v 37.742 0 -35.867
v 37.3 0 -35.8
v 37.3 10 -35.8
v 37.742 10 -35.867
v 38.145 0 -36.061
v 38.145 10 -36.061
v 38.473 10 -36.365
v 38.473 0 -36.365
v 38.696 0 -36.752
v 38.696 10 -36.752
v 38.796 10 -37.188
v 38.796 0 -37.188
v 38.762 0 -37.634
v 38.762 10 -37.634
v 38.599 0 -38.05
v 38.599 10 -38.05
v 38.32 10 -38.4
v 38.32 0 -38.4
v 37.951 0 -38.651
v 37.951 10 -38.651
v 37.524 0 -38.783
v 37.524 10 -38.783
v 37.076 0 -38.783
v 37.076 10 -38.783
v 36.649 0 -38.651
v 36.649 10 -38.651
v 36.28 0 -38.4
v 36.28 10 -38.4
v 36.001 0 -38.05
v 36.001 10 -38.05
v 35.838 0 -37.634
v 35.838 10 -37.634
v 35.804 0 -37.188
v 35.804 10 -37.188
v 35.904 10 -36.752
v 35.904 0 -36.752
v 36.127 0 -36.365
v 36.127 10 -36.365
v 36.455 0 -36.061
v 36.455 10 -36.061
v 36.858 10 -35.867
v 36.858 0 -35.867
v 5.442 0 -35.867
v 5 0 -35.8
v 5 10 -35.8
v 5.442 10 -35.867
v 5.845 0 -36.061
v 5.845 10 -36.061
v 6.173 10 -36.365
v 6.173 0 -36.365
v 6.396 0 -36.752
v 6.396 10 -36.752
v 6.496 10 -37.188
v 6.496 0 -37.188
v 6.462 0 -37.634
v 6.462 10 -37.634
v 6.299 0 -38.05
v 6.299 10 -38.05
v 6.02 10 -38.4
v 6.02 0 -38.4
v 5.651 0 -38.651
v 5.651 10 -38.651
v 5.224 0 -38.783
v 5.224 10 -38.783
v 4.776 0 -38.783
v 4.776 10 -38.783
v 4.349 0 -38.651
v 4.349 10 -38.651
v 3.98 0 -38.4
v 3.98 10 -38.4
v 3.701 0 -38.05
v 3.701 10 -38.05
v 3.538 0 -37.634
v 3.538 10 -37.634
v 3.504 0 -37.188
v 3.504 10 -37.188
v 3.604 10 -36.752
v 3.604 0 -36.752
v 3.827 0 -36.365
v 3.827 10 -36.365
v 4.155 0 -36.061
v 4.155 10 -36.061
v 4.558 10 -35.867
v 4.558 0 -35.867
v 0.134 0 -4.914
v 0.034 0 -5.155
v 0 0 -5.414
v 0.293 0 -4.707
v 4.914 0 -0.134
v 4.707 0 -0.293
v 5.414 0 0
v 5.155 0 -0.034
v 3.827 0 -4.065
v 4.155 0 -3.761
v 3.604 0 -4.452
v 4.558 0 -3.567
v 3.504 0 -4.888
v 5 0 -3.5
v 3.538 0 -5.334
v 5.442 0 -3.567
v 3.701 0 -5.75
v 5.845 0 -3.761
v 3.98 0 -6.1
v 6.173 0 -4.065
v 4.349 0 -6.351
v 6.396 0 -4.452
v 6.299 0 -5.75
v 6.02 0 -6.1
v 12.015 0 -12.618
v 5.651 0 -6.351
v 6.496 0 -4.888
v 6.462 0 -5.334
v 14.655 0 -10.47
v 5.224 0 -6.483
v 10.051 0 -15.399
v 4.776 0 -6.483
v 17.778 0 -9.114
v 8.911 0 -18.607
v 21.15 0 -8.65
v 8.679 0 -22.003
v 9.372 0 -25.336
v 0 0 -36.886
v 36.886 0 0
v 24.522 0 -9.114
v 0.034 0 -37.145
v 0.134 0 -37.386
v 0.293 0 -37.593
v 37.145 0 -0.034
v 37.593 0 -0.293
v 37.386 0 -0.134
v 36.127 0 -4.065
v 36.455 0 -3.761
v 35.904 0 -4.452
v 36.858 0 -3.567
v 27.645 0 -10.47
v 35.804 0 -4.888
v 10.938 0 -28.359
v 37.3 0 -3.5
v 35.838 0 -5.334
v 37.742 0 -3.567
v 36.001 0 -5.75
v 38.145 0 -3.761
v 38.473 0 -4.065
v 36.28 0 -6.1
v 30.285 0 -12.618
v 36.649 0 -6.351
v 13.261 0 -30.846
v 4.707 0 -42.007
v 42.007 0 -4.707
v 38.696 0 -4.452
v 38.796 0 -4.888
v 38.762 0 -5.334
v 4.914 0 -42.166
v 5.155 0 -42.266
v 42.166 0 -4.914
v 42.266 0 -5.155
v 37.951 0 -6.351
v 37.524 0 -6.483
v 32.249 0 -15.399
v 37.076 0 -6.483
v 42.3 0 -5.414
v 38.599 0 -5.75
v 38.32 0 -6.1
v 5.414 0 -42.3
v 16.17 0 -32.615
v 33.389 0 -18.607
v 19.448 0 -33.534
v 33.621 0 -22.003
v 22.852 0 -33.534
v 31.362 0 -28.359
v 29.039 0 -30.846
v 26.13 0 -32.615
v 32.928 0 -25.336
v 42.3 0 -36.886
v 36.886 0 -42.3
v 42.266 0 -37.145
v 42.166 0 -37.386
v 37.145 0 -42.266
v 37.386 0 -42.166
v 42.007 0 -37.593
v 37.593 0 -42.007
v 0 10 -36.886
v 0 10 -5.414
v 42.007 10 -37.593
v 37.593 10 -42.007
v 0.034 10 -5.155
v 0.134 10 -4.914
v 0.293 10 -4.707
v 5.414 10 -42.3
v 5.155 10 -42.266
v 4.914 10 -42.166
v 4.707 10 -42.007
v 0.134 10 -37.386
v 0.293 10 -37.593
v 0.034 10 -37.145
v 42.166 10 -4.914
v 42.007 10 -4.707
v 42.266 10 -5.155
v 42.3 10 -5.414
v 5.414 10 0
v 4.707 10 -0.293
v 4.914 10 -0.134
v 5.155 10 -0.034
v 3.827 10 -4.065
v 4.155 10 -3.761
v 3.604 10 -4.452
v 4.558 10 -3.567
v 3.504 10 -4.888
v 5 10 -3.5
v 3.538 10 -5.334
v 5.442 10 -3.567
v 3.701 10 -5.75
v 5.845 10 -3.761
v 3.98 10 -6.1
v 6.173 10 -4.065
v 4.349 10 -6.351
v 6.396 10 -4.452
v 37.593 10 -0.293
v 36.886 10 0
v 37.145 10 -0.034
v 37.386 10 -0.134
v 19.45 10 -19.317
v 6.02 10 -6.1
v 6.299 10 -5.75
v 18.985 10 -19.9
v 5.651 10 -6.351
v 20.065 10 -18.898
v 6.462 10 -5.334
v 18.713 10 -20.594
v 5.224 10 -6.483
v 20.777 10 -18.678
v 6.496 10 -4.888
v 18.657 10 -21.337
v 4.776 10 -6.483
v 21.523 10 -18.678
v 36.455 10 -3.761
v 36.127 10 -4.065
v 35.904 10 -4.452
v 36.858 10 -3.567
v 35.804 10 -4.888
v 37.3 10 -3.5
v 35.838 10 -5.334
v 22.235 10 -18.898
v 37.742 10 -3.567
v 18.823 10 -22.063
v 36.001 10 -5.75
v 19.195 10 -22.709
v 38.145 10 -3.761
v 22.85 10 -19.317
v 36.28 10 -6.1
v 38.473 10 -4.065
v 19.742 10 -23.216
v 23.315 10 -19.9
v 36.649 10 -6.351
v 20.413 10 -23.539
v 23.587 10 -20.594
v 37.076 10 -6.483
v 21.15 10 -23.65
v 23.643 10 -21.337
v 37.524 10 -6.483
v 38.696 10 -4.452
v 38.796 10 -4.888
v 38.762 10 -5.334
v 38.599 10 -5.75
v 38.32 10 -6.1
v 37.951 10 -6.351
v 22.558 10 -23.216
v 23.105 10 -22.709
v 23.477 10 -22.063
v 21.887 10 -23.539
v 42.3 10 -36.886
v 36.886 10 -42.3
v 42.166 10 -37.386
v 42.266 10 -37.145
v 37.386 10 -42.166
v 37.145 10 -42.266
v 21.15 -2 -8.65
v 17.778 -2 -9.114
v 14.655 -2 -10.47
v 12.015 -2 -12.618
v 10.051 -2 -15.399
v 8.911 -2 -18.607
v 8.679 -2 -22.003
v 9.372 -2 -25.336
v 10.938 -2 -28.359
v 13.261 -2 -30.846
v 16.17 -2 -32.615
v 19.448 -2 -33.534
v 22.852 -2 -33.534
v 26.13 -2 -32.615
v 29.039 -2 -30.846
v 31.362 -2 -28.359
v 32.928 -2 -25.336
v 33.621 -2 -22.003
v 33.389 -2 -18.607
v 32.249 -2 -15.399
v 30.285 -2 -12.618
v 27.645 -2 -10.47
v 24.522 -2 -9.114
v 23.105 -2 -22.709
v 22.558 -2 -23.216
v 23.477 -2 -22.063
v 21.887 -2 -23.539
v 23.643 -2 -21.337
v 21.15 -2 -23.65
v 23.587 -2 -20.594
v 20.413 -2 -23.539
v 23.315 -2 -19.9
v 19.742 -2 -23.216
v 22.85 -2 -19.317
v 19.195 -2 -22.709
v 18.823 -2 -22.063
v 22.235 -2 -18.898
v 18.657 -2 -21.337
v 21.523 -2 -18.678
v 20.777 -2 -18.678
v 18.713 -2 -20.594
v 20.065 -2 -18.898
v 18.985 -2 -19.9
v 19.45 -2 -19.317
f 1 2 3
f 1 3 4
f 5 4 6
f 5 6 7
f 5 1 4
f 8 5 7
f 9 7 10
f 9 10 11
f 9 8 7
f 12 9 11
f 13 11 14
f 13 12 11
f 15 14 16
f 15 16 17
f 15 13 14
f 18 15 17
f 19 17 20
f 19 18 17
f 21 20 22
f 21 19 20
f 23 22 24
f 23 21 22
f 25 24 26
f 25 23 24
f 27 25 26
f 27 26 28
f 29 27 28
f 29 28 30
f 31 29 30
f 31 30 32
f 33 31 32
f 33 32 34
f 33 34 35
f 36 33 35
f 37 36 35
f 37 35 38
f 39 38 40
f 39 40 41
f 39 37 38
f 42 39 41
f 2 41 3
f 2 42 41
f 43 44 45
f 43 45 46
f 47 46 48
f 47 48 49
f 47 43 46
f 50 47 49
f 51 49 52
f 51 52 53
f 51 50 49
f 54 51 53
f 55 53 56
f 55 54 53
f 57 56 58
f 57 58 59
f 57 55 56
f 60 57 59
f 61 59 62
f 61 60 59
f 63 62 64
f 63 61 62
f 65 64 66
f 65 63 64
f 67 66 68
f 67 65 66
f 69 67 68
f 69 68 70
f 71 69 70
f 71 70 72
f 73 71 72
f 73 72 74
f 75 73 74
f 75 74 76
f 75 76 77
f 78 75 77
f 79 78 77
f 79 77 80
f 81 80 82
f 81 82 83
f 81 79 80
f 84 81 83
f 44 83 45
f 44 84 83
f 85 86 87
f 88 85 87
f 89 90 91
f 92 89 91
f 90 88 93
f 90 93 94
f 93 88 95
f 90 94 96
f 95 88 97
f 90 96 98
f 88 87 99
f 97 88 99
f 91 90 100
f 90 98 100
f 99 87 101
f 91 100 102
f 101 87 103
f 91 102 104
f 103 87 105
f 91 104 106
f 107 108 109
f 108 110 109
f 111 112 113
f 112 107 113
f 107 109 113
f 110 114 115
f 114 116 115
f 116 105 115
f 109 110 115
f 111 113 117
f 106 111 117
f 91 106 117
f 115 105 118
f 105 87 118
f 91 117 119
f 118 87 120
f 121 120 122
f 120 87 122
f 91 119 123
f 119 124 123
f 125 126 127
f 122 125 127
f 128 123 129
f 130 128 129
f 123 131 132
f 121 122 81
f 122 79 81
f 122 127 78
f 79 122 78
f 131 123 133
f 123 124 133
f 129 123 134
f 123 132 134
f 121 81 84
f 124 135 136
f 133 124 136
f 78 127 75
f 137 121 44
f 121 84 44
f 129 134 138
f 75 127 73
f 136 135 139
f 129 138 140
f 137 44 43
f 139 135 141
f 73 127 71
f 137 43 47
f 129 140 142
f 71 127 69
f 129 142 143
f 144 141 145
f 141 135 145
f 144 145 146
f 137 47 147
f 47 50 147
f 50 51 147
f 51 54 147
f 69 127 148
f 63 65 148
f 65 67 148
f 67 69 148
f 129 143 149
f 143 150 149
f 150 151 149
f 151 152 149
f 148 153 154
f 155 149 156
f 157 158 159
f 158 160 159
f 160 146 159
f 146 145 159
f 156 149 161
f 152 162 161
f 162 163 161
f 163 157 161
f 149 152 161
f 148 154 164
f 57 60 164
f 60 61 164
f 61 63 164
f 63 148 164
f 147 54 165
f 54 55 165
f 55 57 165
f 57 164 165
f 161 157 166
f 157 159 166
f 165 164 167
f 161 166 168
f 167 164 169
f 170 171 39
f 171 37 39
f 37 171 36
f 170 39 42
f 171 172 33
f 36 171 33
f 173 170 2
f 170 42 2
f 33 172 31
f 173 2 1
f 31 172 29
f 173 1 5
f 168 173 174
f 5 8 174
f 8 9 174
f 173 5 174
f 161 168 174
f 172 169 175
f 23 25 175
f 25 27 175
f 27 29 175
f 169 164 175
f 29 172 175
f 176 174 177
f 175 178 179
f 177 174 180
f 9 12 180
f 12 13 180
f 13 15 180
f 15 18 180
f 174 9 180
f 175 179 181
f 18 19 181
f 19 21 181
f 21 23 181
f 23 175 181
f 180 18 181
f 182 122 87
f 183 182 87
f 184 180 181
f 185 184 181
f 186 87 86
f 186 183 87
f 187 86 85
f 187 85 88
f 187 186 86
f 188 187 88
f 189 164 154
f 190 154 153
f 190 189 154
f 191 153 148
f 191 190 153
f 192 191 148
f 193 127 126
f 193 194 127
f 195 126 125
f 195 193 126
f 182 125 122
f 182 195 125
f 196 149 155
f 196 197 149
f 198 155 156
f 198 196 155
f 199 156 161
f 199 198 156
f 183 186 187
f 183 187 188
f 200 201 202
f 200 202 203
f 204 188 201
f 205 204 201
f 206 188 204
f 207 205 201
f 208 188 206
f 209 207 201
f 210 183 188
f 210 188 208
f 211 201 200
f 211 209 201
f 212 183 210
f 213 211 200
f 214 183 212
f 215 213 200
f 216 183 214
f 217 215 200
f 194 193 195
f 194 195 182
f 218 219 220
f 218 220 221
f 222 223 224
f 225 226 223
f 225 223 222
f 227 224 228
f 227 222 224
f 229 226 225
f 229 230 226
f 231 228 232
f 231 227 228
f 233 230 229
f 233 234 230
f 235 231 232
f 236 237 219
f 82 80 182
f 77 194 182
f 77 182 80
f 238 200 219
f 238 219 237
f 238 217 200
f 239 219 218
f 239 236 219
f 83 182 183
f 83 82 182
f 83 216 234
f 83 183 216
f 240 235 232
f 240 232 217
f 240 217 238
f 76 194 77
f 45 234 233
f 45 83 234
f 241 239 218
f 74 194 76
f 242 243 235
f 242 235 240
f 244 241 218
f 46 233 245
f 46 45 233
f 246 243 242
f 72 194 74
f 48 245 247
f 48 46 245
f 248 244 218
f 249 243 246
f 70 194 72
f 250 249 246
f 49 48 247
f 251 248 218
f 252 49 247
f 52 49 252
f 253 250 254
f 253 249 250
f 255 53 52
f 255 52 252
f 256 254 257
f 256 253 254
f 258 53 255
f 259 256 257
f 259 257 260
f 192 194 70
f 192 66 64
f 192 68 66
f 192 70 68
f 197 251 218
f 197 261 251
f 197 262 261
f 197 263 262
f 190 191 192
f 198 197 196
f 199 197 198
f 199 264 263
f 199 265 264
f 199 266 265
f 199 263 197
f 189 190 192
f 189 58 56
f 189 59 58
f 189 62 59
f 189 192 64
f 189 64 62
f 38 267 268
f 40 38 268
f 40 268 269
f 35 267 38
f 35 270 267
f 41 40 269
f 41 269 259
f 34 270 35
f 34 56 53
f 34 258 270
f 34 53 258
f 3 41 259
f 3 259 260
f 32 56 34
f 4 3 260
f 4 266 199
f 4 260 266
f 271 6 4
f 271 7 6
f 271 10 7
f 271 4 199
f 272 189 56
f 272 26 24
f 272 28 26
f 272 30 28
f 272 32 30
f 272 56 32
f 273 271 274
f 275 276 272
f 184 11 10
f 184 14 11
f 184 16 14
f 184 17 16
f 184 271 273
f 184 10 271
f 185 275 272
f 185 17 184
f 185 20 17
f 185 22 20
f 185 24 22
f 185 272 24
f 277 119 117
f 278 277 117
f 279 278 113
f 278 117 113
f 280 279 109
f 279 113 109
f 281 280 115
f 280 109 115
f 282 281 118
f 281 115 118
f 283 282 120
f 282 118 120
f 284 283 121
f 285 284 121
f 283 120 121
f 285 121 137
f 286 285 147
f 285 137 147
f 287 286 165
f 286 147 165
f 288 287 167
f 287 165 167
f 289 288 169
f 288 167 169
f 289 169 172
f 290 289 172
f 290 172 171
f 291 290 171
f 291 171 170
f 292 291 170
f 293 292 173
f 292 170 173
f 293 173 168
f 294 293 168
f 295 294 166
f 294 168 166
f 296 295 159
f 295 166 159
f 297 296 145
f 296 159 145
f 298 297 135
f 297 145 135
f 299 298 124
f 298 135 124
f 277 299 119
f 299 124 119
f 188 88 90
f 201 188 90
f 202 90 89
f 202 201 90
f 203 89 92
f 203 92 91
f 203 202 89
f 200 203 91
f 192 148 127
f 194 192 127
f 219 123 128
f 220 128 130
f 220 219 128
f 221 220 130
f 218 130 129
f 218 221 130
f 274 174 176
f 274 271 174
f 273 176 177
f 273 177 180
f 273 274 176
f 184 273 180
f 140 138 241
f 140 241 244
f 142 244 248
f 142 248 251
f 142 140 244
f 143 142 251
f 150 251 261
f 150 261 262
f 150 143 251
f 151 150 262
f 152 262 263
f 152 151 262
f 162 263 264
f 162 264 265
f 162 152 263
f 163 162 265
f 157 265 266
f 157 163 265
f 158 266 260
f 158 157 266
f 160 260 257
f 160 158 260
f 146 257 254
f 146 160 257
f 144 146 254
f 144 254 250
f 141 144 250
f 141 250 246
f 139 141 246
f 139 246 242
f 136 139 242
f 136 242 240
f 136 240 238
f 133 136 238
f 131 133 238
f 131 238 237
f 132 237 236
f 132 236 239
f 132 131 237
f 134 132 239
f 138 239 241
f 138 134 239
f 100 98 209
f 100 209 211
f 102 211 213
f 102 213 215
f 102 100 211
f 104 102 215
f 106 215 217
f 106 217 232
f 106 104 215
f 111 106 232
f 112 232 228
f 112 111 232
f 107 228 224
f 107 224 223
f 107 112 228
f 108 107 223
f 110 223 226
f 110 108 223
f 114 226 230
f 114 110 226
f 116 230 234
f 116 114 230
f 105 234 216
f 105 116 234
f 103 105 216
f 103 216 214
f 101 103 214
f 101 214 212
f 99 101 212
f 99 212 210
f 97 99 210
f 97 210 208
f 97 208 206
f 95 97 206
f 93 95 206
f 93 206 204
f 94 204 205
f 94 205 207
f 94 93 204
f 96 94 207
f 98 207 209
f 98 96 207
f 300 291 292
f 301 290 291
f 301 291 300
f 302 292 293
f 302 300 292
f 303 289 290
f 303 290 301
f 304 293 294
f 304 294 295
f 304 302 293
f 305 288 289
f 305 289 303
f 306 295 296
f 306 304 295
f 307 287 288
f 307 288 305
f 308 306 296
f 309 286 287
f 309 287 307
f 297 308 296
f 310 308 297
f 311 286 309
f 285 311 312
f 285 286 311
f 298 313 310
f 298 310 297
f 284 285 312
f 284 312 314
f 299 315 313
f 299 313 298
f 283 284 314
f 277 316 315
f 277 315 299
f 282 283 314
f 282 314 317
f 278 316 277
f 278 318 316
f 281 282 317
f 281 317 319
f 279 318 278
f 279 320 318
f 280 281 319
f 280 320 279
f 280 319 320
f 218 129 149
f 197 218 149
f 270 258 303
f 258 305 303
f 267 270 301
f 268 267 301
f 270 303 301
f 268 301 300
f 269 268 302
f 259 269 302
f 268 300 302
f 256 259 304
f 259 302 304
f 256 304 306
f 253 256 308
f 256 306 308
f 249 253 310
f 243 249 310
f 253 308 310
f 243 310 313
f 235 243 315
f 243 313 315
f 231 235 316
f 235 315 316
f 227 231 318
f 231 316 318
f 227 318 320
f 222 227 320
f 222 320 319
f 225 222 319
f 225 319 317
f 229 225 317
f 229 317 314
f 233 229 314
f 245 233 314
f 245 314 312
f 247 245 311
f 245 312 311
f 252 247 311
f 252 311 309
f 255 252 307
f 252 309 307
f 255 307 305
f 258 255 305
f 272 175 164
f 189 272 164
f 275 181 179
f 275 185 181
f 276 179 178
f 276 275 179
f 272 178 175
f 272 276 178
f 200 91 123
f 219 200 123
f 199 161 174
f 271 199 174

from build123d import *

# Parameters (mm, degrees)
SKETCH1_R           = 1.5
BOSS_EXTRUDE1_DEPTH = 10
FILLET1_R           = 1
FILLET2_R           = 1
FILLET3_R           = 1
FILLET4_R           = 1
FILLET5_R           = 1
FILLET6_R           = 1
FILLET7_R           = 1
FILLET8_R           = 1
SKETCH2_R           = 12.5
BOSS_EXTRUDE2_DEPTH = 2
SKETCH4_R           = 2.5
CUT_EXTRUDE1_DEPTH  = 10
SKETCH5_R           = 2.5
CUT_EXTRUDE2_DEPTH  = 50


with BuildPart() as part:
    # Sketch1 → Boss-Extrude1 (new body)
    with BuildSketch(Plane(origin=(0, 0, 0), x_dir=(1, 0, 0), z_dir=(0, 1, 0))):
        Polygon((37.3, 42.3), (5, 42.3), (0, 37.3), (0, 5), (5, 0), (37.3, 0), (42.3, 5), (42.3, 37.3), align=None)
        with Locations(Location((5, 5, 0), (0, 0, 270))):
            Circle(SKETCH1_R, mode=Mode.SUBTRACT)
        with Locations(Location((37.3, 5, 0), (0, 0, 270))):
            Circle(SKETCH1_R, mode=Mode.SUBTRACT)
        with Locations(Location((5, 37.3, 0), (0, 0, 270))):
            Circle(SKETCH1_R, mode=Mode.SUBTRACT)
        with Locations(Location((37.3, 37.3, 0), (0, 0, 270))):
            Circle(SKETCH1_R, mode=Mode.SUBTRACT)
    extrude(amount=BOSS_EXTRUDE1_DEPTH)

    # Fillet1
    fillet1_edges = [part.edges().sort_by_distance(p)[0] for p in [
        (0, 5, -5),
    ]]
    fillet(fillet1_edges, radius=FILLET1_R)

    # Fillet2
    fillet2_edges = [part.edges().sort_by_distance(p)[0] for p in [
        (5, 5, 0),
    ]]
    fillet(fillet2_edges, radius=FILLET2_R)

    # Fillet3
    fillet3_edges = [part.edges().sort_by_distance(p)[0] for p in [
        (37.3, 5, 0),
    ]]
    fillet(fillet3_edges, radius=FILLET3_R)

    # Fillet4
    fillet4_edges = [part.edges().sort_by_distance(p)[0] for p in [
        (42.3, 5, -5),
    ]]
    fillet(fillet4_edges, radius=FILLET4_R)

    # Fillet5
    fillet5_edges = [part.edges().sort_by_distance(p)[0] for p in [
        (42.3, 5, -37.3),
    ]]
    fillet(fillet5_edges, radius=FILLET5_R)

    # Fillet6
    fillet6_edges = [part.edges().sort_by_distance(p)[0] for p in [
        (37.3, 5, -42.3),
    ]]
    fillet(fillet6_edges, radius=FILLET6_R)

    # Fillet7
    fillet7_edges = [part.edges().sort_by_distance(p)[0] for p in [
        (5, 5, -42.3),
    ]]
    fillet(fillet7_edges, radius=FILLET7_R)

    # Fillet8
    fillet8_edges = [part.edges().sort_by_distance(p)[0] for p in [
        (0, 5, -37.3),
    ]]
    fillet(fillet8_edges, radius=FILLET8_R)

    # Sketch2 → Boss-Extrude2 (add)
    with BuildSketch(Plane.XZ):
        with Locations(Location((21.15, -21.15, 0), (0, 0, 90))):
            Circle(SKETCH2_R)
    extrude(amount=BOSS_EXTRUDE2_DEPTH)

    # Sketch4 → Cut-Extrude1 (cut)
    with BuildSketch(Plane.XZ.offset(2)):
        with Locations(Location((21.15, -21.15, 0), (0, 0, 270))):
            Circle(SKETCH4_R)
    extrude(amount=-CUT_EXTRUDE1_DEPTH, mode=Mode.SUBTRACT)

    # Sketch5 → Cut-Extrude2 (cut)
    with BuildSketch(Plane.XZ.offset(2)):
        with Locations(Location((21.15, -21.15, 0), (0, 0, 270))):
            Circle(SKETCH5_R)
    extrude(amount=-CUT_EXTRUDE2_DEPTH, mode=Mode.SUBTRACT)


solid = part.part
